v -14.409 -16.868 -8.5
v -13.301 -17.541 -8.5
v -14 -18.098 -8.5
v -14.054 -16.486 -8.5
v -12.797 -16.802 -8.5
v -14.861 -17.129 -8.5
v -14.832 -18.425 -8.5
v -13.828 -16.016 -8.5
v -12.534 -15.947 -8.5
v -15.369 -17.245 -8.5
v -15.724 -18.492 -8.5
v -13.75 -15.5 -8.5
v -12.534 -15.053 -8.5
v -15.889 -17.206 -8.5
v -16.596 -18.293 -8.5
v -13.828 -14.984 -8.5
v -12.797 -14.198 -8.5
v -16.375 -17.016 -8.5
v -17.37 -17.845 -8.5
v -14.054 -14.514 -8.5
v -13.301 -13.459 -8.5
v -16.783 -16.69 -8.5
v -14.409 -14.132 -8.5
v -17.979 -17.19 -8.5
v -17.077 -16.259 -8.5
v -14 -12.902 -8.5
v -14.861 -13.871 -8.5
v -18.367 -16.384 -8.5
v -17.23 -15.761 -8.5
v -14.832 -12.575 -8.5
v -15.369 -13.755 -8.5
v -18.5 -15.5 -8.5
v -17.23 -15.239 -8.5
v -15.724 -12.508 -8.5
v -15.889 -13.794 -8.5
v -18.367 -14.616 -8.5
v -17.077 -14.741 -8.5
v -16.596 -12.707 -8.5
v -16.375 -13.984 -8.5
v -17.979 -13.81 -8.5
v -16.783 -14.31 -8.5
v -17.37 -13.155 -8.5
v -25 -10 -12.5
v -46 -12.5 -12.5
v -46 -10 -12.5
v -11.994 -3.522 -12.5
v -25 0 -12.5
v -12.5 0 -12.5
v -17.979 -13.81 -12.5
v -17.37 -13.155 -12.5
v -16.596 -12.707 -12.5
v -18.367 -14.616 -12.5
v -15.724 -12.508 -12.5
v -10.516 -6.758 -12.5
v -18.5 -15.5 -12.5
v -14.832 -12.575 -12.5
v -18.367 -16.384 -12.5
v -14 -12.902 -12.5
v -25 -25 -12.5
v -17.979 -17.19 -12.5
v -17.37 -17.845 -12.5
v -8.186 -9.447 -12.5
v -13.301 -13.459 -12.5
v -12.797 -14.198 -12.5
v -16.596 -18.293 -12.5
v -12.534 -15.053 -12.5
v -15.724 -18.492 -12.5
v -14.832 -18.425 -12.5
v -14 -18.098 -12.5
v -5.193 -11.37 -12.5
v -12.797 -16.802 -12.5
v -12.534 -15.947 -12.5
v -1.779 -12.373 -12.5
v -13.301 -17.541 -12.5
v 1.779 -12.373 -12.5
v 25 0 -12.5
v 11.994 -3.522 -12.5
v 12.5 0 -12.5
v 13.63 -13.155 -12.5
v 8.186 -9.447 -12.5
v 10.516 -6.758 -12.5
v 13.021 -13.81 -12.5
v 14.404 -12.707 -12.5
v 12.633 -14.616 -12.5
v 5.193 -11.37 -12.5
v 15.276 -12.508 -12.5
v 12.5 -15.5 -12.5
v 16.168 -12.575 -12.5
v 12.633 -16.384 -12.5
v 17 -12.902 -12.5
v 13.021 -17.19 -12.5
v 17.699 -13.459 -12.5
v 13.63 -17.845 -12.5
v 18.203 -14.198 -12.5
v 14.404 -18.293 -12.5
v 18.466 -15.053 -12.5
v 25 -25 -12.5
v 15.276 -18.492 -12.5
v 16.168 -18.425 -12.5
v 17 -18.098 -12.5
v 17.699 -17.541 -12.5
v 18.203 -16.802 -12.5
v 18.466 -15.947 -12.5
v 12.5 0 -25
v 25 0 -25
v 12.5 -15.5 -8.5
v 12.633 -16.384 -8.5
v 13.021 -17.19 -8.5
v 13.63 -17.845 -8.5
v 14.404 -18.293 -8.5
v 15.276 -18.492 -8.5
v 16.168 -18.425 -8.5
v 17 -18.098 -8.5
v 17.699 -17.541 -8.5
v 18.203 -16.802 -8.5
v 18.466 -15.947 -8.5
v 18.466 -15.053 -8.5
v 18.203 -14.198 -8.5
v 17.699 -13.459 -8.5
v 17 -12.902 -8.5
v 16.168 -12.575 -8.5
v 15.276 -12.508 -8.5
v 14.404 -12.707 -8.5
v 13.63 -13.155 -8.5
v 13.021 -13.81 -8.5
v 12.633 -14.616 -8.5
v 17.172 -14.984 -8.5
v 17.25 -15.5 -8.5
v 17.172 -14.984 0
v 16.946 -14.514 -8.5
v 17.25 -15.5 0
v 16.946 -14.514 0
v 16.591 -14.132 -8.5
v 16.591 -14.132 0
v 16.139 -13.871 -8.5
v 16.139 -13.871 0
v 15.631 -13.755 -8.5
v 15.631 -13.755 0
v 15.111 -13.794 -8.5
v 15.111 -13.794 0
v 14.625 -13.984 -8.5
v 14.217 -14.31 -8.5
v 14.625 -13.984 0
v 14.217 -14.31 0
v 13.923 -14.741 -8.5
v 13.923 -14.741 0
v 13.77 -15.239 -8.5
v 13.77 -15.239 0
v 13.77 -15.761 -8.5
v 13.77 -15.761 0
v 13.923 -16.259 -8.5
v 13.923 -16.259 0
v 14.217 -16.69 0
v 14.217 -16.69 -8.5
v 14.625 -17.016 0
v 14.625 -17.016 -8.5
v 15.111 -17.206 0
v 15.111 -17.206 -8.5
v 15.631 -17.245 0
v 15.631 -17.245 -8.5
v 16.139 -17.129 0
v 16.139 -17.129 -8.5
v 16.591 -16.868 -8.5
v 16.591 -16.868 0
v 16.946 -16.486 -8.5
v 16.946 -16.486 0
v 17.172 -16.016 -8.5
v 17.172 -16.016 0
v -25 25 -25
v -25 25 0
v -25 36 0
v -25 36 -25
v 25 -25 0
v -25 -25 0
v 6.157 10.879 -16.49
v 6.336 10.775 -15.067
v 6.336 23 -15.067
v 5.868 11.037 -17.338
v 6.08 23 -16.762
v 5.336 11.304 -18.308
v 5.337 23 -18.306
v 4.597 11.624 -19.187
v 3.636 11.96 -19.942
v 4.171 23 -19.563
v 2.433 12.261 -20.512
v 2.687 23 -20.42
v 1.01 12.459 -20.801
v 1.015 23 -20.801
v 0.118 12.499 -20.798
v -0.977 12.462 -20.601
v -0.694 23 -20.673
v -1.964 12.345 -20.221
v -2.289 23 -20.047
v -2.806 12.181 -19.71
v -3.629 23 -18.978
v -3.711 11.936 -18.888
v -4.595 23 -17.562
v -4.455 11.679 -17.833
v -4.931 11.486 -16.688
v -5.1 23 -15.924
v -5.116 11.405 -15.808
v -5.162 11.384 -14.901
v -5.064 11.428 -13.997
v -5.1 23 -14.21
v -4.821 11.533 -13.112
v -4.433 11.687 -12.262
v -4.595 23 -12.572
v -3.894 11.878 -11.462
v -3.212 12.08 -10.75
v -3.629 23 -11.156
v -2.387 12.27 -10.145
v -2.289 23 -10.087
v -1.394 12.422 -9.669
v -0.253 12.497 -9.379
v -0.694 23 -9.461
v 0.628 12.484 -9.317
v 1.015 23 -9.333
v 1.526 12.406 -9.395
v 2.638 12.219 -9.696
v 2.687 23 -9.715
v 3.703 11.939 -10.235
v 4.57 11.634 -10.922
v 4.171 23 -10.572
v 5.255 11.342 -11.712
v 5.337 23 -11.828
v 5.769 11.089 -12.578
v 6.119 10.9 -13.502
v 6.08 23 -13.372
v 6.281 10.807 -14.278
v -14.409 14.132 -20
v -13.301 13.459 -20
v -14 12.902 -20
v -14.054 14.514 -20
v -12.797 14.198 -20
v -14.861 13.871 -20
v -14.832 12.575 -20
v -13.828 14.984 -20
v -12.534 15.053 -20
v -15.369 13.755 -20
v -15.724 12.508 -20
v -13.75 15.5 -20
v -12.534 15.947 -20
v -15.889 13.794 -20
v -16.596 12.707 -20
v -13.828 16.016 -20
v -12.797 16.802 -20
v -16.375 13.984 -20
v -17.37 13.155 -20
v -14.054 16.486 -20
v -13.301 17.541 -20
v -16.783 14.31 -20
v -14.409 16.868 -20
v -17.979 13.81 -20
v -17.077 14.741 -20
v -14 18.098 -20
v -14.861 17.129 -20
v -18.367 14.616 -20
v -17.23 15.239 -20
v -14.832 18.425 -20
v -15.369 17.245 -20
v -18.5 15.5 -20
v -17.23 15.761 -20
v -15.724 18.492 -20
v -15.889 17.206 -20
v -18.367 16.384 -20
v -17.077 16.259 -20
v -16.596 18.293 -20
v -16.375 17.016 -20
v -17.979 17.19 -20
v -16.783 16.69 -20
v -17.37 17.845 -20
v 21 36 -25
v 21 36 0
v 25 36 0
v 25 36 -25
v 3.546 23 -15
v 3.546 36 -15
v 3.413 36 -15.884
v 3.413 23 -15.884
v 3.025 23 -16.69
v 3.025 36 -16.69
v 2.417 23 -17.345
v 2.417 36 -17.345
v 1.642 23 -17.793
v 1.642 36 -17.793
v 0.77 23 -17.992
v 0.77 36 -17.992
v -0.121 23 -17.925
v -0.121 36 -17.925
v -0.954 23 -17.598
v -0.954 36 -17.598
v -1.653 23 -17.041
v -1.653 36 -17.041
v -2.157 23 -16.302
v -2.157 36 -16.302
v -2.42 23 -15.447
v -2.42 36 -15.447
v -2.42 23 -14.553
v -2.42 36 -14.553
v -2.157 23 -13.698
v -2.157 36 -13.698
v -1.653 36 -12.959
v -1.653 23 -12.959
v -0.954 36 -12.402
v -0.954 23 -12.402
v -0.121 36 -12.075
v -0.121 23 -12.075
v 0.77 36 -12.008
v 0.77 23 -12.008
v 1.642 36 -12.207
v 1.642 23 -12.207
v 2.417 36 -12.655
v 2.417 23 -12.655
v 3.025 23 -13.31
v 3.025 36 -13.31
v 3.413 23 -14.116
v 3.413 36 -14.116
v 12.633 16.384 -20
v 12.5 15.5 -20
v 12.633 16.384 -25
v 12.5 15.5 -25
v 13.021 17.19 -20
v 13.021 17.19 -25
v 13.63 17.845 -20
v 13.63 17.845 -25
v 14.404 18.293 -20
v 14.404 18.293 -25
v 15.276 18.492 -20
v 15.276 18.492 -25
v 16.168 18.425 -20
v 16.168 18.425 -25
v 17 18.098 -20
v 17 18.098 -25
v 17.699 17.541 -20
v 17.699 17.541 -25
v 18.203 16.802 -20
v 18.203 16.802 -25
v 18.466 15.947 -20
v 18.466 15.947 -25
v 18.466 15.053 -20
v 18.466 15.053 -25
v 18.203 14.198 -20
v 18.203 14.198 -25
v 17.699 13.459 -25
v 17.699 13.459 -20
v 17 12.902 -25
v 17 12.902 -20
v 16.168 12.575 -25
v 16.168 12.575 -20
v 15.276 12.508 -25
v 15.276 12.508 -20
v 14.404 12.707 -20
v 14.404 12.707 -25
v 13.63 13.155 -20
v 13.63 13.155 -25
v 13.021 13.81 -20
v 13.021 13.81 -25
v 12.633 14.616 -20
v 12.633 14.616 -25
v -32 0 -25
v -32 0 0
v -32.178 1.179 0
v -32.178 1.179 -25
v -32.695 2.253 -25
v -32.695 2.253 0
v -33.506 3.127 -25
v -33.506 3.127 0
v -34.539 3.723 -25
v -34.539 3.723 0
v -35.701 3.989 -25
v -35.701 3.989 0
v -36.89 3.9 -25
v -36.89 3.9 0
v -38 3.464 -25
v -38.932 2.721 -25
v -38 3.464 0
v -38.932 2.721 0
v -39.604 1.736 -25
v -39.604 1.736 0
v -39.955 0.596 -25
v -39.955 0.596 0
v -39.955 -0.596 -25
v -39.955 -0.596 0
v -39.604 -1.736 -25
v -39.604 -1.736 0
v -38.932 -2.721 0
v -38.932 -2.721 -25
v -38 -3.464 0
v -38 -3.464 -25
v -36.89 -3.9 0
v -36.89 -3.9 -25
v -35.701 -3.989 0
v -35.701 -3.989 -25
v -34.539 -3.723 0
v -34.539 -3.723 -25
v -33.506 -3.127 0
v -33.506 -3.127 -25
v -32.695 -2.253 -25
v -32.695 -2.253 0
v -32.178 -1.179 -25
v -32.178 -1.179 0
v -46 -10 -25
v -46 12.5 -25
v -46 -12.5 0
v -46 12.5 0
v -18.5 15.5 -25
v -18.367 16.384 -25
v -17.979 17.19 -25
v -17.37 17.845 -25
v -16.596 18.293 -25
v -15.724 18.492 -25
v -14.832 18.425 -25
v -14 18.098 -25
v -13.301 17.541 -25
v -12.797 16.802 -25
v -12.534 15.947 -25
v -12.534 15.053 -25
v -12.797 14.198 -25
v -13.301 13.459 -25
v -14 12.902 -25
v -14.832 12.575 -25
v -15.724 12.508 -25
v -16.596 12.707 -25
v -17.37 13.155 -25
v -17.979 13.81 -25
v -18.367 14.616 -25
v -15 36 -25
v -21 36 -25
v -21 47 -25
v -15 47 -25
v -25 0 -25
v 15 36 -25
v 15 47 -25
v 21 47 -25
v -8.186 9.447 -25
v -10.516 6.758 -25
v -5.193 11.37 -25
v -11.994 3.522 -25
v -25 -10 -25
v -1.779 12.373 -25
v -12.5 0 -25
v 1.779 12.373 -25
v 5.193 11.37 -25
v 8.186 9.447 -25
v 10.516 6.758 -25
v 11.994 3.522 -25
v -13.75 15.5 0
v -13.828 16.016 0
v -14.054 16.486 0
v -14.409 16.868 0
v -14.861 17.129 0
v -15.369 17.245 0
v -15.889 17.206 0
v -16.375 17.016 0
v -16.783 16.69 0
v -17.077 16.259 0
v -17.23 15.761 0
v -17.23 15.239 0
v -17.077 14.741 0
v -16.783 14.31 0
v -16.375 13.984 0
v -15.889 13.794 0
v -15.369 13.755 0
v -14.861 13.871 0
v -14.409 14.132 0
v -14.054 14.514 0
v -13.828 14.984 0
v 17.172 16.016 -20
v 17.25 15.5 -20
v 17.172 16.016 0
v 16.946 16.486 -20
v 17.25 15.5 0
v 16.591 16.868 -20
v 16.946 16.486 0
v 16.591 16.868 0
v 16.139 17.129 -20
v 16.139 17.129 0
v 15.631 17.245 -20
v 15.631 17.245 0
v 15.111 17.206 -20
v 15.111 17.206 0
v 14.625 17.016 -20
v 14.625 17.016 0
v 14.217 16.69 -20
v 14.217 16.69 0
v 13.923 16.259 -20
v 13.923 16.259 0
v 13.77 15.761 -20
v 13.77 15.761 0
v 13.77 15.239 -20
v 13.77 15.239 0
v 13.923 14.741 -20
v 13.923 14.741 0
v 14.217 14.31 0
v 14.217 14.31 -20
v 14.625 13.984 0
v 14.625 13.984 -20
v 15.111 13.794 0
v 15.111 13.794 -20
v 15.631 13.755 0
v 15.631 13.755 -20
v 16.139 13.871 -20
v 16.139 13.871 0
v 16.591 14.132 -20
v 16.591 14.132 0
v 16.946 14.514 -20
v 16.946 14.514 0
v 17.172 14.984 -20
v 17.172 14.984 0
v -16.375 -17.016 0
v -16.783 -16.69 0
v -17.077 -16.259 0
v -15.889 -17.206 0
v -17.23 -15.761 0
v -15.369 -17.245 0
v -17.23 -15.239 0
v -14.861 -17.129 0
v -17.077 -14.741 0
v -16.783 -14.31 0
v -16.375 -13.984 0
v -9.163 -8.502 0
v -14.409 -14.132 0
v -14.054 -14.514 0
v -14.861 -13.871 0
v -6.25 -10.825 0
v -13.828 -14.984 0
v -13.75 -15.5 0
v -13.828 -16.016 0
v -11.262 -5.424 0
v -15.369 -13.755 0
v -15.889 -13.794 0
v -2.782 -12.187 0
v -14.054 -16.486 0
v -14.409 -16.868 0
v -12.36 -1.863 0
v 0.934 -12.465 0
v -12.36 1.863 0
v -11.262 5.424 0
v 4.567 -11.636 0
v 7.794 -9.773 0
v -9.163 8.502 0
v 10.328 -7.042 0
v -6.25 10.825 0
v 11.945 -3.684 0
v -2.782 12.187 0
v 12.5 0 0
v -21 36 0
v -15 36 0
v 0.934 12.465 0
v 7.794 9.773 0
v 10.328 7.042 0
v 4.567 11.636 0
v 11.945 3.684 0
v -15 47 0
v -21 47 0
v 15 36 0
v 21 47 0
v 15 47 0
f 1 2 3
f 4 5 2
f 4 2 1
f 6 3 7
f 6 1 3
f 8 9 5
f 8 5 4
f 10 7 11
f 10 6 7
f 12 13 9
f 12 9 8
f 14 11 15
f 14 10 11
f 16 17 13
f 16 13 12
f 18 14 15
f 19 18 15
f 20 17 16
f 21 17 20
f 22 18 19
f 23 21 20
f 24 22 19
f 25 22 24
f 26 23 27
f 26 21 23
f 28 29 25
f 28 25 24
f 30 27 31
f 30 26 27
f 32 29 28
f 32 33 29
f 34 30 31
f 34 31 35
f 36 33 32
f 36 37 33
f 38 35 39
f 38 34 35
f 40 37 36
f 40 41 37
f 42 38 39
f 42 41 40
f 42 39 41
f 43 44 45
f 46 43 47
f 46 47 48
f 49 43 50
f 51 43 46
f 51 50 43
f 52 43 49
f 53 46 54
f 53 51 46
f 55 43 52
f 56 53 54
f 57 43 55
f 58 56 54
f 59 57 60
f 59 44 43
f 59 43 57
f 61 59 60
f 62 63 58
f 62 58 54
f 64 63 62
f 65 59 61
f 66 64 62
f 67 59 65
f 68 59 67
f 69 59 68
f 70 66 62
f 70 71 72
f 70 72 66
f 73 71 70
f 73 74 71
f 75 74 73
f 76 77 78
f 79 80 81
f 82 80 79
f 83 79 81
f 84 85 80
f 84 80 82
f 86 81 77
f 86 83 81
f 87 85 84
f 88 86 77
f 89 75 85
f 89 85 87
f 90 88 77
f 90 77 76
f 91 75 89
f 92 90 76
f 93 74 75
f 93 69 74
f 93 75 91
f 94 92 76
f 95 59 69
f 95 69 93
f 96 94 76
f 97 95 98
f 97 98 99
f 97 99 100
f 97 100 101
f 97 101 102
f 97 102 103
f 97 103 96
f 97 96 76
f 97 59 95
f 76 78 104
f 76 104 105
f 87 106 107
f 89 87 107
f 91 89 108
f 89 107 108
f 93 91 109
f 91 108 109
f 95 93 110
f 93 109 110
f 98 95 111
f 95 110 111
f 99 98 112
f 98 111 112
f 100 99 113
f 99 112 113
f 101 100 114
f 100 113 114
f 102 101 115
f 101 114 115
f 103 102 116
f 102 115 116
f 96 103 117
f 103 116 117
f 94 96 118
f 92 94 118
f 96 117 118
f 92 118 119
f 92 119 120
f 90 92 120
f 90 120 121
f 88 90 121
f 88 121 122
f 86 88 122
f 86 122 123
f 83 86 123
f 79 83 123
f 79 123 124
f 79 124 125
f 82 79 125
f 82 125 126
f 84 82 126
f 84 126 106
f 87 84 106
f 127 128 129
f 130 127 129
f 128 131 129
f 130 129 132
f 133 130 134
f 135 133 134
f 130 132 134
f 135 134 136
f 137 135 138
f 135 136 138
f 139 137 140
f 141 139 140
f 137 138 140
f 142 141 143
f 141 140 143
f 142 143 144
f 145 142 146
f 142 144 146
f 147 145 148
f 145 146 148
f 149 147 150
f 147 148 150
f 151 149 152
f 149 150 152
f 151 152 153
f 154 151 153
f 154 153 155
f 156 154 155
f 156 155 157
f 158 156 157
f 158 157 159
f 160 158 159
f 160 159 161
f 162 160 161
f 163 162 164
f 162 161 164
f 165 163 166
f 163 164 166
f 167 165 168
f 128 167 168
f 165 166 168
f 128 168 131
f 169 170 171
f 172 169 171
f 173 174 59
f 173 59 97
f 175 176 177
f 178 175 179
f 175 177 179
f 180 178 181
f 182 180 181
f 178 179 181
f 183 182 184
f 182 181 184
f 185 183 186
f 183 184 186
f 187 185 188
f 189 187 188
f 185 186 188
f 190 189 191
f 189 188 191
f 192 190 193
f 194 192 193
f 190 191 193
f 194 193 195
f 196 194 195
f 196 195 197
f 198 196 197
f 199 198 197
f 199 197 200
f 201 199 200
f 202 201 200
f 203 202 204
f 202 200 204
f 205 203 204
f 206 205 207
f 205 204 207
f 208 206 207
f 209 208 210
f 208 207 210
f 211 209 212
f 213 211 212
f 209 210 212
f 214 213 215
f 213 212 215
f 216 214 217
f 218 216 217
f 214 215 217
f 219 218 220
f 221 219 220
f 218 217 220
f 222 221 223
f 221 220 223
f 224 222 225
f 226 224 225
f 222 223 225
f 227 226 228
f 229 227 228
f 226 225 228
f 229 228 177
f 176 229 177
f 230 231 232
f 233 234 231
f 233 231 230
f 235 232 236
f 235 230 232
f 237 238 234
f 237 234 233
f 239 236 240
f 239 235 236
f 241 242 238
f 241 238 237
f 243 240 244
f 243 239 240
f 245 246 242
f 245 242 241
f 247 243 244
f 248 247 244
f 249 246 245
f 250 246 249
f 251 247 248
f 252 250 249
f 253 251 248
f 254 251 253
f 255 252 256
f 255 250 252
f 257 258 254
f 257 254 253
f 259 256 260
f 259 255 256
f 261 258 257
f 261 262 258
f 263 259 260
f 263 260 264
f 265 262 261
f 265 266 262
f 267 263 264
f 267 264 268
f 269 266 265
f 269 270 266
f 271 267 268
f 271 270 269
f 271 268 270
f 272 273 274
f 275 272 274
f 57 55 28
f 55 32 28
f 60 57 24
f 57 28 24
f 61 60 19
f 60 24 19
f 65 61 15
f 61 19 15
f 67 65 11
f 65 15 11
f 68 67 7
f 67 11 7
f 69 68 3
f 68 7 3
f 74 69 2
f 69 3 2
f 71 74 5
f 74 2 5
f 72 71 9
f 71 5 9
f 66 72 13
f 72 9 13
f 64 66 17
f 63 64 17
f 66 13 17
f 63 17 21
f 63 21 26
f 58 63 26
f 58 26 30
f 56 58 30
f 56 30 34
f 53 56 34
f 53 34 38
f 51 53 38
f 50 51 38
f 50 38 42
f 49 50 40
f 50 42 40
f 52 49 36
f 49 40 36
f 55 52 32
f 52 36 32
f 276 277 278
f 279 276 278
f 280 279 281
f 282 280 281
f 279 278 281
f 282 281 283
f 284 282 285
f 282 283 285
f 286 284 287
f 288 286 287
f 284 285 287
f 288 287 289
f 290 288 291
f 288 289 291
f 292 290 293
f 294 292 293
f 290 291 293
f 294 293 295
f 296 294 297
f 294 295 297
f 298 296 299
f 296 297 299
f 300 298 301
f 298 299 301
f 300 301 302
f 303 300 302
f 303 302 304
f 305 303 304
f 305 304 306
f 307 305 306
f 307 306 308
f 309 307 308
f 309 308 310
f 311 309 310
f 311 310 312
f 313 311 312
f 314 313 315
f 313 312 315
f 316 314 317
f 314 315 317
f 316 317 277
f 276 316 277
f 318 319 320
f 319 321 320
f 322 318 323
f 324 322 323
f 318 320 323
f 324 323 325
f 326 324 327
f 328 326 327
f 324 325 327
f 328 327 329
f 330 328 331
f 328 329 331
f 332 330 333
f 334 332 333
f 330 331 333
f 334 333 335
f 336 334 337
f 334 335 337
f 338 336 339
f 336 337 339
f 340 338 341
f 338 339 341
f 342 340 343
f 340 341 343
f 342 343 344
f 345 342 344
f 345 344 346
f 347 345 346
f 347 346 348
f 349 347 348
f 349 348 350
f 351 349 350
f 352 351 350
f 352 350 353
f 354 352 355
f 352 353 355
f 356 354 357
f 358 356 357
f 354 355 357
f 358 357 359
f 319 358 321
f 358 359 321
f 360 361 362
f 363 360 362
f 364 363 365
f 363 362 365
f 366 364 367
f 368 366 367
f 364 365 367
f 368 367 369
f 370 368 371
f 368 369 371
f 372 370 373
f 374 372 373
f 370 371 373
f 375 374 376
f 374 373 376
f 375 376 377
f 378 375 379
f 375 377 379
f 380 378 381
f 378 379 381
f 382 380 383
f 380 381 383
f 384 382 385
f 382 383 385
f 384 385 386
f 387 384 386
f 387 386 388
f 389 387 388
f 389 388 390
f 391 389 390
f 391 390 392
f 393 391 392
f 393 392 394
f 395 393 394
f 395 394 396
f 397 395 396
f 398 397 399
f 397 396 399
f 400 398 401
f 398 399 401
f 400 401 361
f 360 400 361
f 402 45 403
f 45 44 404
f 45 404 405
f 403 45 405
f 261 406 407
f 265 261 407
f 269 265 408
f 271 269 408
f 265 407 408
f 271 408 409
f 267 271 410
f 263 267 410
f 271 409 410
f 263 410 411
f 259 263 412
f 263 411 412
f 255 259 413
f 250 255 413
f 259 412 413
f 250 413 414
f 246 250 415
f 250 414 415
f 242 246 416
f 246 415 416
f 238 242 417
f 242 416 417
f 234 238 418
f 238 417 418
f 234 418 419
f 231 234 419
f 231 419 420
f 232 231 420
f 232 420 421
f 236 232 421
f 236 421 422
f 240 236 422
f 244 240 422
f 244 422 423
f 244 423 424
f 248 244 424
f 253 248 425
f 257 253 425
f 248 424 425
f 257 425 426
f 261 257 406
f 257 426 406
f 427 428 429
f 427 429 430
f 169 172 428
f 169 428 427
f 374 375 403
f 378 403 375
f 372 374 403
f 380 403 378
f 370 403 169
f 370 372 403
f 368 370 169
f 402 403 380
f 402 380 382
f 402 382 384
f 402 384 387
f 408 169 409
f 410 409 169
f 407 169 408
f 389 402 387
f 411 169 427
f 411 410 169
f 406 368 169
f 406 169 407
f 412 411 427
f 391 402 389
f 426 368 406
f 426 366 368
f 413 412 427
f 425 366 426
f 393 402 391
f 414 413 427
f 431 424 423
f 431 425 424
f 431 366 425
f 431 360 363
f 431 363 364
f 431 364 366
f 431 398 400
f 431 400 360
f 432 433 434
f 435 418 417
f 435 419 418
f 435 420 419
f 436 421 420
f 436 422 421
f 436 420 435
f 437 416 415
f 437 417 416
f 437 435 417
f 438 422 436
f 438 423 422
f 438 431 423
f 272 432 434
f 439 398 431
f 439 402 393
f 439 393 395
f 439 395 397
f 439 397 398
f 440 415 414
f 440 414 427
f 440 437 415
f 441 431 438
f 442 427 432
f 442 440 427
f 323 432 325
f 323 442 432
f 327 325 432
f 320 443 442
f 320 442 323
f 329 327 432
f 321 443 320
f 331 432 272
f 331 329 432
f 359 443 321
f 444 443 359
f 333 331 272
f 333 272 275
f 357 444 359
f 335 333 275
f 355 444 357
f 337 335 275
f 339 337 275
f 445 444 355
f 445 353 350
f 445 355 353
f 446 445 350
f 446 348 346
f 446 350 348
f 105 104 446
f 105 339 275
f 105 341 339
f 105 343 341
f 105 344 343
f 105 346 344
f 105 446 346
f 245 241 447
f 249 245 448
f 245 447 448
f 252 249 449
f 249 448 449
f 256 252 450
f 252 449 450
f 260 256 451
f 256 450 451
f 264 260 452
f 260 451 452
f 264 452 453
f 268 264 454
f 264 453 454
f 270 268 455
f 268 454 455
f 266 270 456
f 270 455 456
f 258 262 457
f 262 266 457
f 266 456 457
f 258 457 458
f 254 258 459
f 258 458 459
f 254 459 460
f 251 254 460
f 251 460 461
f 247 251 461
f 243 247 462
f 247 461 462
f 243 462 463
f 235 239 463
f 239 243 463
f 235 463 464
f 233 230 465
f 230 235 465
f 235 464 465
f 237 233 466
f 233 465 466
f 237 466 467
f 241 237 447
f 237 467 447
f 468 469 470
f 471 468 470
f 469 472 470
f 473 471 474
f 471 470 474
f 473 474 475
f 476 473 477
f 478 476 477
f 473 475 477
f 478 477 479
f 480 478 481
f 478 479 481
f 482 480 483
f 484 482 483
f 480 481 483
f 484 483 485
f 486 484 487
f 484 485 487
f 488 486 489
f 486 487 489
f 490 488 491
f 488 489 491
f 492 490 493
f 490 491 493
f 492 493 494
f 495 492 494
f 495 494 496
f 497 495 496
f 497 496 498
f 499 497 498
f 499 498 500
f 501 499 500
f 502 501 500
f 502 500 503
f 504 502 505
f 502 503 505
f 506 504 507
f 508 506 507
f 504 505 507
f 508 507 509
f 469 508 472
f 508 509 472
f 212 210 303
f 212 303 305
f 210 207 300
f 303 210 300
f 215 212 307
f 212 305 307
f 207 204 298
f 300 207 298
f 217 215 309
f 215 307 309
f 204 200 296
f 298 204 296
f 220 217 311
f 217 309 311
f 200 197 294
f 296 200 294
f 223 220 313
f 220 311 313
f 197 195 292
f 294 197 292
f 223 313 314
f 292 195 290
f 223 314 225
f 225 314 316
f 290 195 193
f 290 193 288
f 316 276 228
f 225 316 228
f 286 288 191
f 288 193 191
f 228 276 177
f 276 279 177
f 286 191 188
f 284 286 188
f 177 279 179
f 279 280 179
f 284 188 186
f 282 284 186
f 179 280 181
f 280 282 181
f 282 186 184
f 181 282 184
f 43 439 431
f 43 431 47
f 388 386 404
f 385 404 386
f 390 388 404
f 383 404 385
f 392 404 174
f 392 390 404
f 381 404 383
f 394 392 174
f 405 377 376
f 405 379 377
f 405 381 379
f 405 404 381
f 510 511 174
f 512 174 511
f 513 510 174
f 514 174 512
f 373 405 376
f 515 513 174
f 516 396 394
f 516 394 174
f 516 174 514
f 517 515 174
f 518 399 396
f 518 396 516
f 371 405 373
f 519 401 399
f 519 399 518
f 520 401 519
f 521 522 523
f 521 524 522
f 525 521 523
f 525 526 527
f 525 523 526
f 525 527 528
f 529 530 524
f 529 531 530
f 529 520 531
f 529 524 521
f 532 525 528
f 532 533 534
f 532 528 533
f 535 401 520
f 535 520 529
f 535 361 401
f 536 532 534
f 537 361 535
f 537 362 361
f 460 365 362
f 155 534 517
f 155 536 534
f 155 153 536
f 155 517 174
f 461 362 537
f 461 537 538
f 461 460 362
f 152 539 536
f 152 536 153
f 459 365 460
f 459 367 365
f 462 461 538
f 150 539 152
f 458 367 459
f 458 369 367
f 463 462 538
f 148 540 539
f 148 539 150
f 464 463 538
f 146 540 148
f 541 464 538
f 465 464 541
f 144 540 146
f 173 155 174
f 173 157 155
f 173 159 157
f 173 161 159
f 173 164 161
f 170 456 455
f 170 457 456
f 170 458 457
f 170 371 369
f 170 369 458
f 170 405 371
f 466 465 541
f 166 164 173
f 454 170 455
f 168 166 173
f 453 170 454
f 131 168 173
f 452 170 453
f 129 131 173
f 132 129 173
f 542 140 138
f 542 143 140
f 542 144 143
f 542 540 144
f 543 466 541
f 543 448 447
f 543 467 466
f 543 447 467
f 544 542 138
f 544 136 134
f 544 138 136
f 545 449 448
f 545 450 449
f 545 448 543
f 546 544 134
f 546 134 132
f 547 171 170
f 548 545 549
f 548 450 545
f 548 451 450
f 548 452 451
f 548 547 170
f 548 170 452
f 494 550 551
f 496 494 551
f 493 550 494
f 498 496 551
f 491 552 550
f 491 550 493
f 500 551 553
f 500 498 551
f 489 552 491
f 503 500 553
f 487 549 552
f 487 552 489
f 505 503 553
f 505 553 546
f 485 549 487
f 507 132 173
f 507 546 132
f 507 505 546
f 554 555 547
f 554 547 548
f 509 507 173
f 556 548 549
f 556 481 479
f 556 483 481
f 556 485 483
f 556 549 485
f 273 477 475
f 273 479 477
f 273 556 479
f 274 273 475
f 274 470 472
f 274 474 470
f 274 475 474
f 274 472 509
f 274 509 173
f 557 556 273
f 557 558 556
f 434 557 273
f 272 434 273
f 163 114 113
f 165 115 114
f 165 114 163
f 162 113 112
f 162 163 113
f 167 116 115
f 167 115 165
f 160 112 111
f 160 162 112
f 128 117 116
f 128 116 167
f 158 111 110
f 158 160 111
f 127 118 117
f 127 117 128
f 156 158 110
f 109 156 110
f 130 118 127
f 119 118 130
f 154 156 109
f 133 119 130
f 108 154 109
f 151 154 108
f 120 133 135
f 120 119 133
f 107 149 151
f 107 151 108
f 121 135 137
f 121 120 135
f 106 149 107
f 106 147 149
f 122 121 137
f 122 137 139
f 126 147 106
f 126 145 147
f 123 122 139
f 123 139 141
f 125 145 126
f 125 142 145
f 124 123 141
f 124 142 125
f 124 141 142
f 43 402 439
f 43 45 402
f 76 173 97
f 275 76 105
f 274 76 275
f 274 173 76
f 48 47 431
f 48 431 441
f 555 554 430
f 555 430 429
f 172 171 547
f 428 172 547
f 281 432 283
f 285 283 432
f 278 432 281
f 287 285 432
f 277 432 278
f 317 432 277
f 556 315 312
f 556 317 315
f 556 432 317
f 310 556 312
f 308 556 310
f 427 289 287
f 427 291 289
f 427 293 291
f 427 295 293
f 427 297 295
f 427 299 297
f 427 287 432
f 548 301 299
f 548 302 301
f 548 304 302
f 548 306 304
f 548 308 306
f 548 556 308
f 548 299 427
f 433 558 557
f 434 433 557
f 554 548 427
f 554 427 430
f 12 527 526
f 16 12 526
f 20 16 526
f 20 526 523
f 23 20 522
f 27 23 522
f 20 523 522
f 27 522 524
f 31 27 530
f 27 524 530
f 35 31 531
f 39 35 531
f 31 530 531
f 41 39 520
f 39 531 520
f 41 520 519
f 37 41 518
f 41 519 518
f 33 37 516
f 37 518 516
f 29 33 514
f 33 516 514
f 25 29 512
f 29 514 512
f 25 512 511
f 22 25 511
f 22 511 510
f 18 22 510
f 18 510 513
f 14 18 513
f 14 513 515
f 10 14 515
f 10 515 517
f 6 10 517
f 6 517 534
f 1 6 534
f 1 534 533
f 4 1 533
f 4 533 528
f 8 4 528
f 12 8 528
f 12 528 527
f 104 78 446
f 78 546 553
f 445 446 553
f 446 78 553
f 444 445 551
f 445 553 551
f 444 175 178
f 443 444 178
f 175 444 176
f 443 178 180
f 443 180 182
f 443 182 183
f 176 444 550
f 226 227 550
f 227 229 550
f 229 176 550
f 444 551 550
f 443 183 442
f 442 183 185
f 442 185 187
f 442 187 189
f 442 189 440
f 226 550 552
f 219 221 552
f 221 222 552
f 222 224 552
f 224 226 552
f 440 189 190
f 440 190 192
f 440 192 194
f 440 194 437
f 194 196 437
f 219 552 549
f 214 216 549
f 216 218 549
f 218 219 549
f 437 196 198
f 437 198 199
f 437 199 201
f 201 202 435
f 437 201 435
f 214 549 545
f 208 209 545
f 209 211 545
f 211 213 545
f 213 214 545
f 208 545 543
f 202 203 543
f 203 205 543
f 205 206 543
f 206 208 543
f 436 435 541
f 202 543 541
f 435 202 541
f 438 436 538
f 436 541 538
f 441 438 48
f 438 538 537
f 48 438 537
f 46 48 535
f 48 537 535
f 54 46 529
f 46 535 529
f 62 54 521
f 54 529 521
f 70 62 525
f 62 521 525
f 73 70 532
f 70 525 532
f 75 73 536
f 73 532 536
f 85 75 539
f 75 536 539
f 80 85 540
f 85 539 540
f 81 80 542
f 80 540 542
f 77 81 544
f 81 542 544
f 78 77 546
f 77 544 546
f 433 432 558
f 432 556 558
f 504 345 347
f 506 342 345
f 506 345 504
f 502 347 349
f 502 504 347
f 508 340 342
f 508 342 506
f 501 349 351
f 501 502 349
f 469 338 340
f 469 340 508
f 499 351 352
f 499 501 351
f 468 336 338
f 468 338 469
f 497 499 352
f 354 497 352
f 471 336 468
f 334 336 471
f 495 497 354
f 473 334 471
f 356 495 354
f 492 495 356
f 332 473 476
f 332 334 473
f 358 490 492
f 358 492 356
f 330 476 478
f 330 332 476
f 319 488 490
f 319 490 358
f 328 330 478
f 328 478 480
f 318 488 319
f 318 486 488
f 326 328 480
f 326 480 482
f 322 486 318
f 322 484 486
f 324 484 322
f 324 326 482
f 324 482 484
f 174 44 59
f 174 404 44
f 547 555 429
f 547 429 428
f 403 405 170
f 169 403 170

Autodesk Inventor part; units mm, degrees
ref_plane "YZ Plane" through (0, 0, 0) normal (1, 0, 0) x (0, 1, 0)
ref_plane "XZ Plane" through (0, 0, 0) normal (0, 1, 0) x (-1, 0, 0)
ref_plane "XY Plane" through (0, 0, 0) normal (0, 0, 1) x (1, 0, 0)
sketch "Sketch1" plane through (0, 0, 0) normal (0, 0, 1) x (1, 0, 0)
  point P0 (0, 0)
sketch "Sketch2" plane through (0, 0, 0) normal (0, 0, 1) x (1, 0, 0)
  line L0 (-25, -25) -> (25, -25)
  line L1 (25, -25) -> (25, 25)
  circle A0 centre (0, 0) radius 12.5
  circle A1 centre (-15.5, 15.5) radius 1.75
  line L2 (25, 25) -> (25, 19)
  line L3 (25, -25) -> (19, -25)
  line L4 (-25, -25) -> (-19, -25)
  circle A2 centre (-15.5, -15.5) radius 1.75
  circle A3 centre (15.5, -15.5) radius 1.75
  circle A4 centre (15.5, 15.5) radius 1.75
  line L5 (-25, 25) -> (-25, 36)
  line L6 (25, 36) -> (25, 25)
  line L7 (0, 36) -> (15, 36)
  line L8 (15, 36) -> (15, 47)
  line L9 (15, 47) -> (21, 47)
  line L10 (21, 47) -> (21, 36)
  line L11 (0, 36) -> (-15, 36)
  line L12 (-15, 36) -> (-15, 47)
  line L13 (-15, 47) -> (-21, 47)
  line L14 (-21, 47) -> (-21, 36)
  circle A5 centre (-36, 0) radius 4
  line L15 (-46, 0) -> (-46, 12.5)
  line L16 (-46, 12.5) -> (-25, 25)
  line L17 (-46, 0) -> (-46, -12.5)
  line L18 (-46, -12.5) -> (-25, -25)
  line L19 (-25, 36) -> (-21, 36)
  line L20 (-15, 36) -> (15, 36)
  line L21 (21, 36) -> (25, 36)
  line L22 (-21, -21) -> (21, -21)
  line L23 (21, -21) -> (21, 21)
  line L24 (21, 21) -> (-21, 21)
  line L25 (-21, 21) -> (-21, -21)
  line L26 (-21, -21) -> (21, 21) construction
  line L27 (21, -21) -> (-21, 21) construction
  dimension "d1" = 50
  dimension "d2" = 25
  dimension "d14" = 3.5
  dimension "d15" = 11
  dimension "d18" = 11
  dimension "d69" = 42
  dimension "d70" = 42
  dimension "d71" = 5.5
  dimension "d72" = 5.5
  dimension "d73" = 5.5
  dimension "d74" = 5.5
  dimension "d75" = 5.5
  dimension "d76" = 5.5
  dimension "d77" = 5.5
  dimension "d78" = 5.5
  dimension "d79" = 8
  dimension "d87" = 36
  dimension "d88" = 46
  dimension "d89" = 25
  dimension "d90" = 50
  dimension "d91" = 50
  dimension "d92" = 15
  dimension "d93" = 6
  dimension "d94" = 4
extrude "Extrusion1" add sketch "Sketch2" against normal blind 25 contours L18 L17 L15 L16 L5 L19 L14 L13 L12 L11 L7 L8 L9 L10 L21 L6 L1 L0 | L25 L24 L23 L22
sketch "Sketch3" plane through (0, 0, 0) normal (0, 1, 0) x (-1, 0, 0)
  point P0 (0, 0)
sketch "Sketch4" plane through (-25, -25, 0) normal (0, -1, 0) x (1, 0, 0)
  point P0 (25, 0)
sketch "Sketch6" plane through (-25, -25, 0) normal (0, -1, 0) x (1, 0, 0)
  line L0 (50, -25) -> (-21, -25)
  line L1 (-21, -25) -> (-21, -12.5)
  line L2 (-21, -12.5) -> (50, -12.5)
  line L3 (50, -12.5) -> (50, -25)
  point P0 (25, 0)
  dimension "d34" = 71
  dimension "d35" = 12.5
extrude "Extrusion2" cut sketch "Sketch6" against normal blind 25
sketch "Sketch7" plane through (25, -25, -12.5) normal (0, 0, -1) x (-1, 0, 0)
  circle A0 centre (40.5, 9.5) radius 1.75 projected
  circle A1 centre (40.5, 9.5) radius 3
  point P0 (25, 25)
  dimension "d38" = 6
extrude "Extrusion3" cut sketch "Sketch7" against normal blind 4 contours A0 | A1
sketch "Sketch8" plane through (25, -25, -12.5) normal (0, 0, -1) x (-1, 0, 0)
  circle A0 centre (9.5, 9.5) radius 1.75 projected
  circle A1 centre (9.5, 9.5) radius 3
  point P0 (25, 25)
  dimension "d44" = 6
extrude "Extrusion4" cut sketch "Sketch8" against normal blind 4 contours A0 | A1
sketch "Sketch9" plane through (0, 0, -25) normal (0, 0, -1) x (-1, 0, 0)
  circle A0 centre (15.5, 15.5) radius 1.75 projected
  circle A1 centre (15.5, 15.5) radius 3
  circle A2 centre (-15.5, 15.5) radius 1.75 projected
  circle A3 centre (-15.5, 15.5) radius 3
  point P0 (0, 0)
  dimension "d47" = 6
  dimension "d48" = 6
extrude "Extrusion5" cut sketch "Sketch9" against normal blind 5 contours A1
sketch "Sketch10" plane through (0, 0, -25) normal (0, 0, -1) x (-1, 0, 0)
  circle A0 centre (-15.5, 15.5) radius 1.75 projected
  circle A1 centre (-15.5, 15.5) radius 3
  point P0 (0, 0)
  dimension "d51" = 6
extrude "Extrusion6" cut sketch "Sketch10" against normal blind 5 contours A0 | A1
move faces "Move1" translate (0, 0, -12.5) faces at (-4.8121, -22.7683, -12.5)
sketch "Sketch11" plane through (-25, -25, 0) normal (0, -1, 0) x (1, 0, 0)
  line L0 (0, -25) -> (50, -25) projected
  line L1 (50, -25) -> (-21, -25)
  line L2 (-21, -25) -> (-21, -12.5)
  line L3 (-21, -12.5) -> (50, -12.5)
  line L4 (50, -12.5) -> (50, -25)
  point P0 (25, 0)
  dimension "d60" = 71
  dimension "d61" = 12.5
extrude "Extrusion7" cut sketch "Sketch11" against normal blind 15
sketch "Sketch12" plane through (-25, -10, 0) normal (0, -1, 0) x (1, 0, 0)
  line L0 (50, -12.5) -> (50, -25) projected
  line L1 (50, -25) -> (0, -25)
  line L2 (0, -25) -> (0, -12.5)
  line L3 (0, -12.5) -> (50, -12.5)
  line L4 (50, -12.5) -> (50, -25)
  point P0 (25, 0)
  dimension "d64" = 50
  dimension "d65" = 12.5
extrude "Extrusion8" cut sketch "Sketch12" against normal blind 10
sketch "Sketch13" plane through (-15, 36, 0) normal (0, 1, 0) x (1, 0, 0)
  point P0 (15, 0)
sketch "Sketch14" plane through (-15, 36, 0) normal (0, 1, 0) x (1, 0, 0)
  circle A0 centre (15.5463, 15) radius 3
  point P0 (15, 0)
  dimension "d80" = 6
extrude "Extrusion9" cut sketch "Sketch14" against normal blind 25
ref_plane "Work Plane6" through (-15, 23, 0) normal (0, 1, 0) x (1, 0, 0)
sketch "Sketch15" plane through (-15, 23, 0) normal (0, 1, 0) x (1, 0, 0)
  circle A0 centre (15.5858, 15.0671) radius 5.75
  point P0 (15, 0)
  dimension "d84" = 11.5
extrude "Extrusion10" cut sketch "Sketch15" against normal blind 25
properties part number "SuporteMotor"
